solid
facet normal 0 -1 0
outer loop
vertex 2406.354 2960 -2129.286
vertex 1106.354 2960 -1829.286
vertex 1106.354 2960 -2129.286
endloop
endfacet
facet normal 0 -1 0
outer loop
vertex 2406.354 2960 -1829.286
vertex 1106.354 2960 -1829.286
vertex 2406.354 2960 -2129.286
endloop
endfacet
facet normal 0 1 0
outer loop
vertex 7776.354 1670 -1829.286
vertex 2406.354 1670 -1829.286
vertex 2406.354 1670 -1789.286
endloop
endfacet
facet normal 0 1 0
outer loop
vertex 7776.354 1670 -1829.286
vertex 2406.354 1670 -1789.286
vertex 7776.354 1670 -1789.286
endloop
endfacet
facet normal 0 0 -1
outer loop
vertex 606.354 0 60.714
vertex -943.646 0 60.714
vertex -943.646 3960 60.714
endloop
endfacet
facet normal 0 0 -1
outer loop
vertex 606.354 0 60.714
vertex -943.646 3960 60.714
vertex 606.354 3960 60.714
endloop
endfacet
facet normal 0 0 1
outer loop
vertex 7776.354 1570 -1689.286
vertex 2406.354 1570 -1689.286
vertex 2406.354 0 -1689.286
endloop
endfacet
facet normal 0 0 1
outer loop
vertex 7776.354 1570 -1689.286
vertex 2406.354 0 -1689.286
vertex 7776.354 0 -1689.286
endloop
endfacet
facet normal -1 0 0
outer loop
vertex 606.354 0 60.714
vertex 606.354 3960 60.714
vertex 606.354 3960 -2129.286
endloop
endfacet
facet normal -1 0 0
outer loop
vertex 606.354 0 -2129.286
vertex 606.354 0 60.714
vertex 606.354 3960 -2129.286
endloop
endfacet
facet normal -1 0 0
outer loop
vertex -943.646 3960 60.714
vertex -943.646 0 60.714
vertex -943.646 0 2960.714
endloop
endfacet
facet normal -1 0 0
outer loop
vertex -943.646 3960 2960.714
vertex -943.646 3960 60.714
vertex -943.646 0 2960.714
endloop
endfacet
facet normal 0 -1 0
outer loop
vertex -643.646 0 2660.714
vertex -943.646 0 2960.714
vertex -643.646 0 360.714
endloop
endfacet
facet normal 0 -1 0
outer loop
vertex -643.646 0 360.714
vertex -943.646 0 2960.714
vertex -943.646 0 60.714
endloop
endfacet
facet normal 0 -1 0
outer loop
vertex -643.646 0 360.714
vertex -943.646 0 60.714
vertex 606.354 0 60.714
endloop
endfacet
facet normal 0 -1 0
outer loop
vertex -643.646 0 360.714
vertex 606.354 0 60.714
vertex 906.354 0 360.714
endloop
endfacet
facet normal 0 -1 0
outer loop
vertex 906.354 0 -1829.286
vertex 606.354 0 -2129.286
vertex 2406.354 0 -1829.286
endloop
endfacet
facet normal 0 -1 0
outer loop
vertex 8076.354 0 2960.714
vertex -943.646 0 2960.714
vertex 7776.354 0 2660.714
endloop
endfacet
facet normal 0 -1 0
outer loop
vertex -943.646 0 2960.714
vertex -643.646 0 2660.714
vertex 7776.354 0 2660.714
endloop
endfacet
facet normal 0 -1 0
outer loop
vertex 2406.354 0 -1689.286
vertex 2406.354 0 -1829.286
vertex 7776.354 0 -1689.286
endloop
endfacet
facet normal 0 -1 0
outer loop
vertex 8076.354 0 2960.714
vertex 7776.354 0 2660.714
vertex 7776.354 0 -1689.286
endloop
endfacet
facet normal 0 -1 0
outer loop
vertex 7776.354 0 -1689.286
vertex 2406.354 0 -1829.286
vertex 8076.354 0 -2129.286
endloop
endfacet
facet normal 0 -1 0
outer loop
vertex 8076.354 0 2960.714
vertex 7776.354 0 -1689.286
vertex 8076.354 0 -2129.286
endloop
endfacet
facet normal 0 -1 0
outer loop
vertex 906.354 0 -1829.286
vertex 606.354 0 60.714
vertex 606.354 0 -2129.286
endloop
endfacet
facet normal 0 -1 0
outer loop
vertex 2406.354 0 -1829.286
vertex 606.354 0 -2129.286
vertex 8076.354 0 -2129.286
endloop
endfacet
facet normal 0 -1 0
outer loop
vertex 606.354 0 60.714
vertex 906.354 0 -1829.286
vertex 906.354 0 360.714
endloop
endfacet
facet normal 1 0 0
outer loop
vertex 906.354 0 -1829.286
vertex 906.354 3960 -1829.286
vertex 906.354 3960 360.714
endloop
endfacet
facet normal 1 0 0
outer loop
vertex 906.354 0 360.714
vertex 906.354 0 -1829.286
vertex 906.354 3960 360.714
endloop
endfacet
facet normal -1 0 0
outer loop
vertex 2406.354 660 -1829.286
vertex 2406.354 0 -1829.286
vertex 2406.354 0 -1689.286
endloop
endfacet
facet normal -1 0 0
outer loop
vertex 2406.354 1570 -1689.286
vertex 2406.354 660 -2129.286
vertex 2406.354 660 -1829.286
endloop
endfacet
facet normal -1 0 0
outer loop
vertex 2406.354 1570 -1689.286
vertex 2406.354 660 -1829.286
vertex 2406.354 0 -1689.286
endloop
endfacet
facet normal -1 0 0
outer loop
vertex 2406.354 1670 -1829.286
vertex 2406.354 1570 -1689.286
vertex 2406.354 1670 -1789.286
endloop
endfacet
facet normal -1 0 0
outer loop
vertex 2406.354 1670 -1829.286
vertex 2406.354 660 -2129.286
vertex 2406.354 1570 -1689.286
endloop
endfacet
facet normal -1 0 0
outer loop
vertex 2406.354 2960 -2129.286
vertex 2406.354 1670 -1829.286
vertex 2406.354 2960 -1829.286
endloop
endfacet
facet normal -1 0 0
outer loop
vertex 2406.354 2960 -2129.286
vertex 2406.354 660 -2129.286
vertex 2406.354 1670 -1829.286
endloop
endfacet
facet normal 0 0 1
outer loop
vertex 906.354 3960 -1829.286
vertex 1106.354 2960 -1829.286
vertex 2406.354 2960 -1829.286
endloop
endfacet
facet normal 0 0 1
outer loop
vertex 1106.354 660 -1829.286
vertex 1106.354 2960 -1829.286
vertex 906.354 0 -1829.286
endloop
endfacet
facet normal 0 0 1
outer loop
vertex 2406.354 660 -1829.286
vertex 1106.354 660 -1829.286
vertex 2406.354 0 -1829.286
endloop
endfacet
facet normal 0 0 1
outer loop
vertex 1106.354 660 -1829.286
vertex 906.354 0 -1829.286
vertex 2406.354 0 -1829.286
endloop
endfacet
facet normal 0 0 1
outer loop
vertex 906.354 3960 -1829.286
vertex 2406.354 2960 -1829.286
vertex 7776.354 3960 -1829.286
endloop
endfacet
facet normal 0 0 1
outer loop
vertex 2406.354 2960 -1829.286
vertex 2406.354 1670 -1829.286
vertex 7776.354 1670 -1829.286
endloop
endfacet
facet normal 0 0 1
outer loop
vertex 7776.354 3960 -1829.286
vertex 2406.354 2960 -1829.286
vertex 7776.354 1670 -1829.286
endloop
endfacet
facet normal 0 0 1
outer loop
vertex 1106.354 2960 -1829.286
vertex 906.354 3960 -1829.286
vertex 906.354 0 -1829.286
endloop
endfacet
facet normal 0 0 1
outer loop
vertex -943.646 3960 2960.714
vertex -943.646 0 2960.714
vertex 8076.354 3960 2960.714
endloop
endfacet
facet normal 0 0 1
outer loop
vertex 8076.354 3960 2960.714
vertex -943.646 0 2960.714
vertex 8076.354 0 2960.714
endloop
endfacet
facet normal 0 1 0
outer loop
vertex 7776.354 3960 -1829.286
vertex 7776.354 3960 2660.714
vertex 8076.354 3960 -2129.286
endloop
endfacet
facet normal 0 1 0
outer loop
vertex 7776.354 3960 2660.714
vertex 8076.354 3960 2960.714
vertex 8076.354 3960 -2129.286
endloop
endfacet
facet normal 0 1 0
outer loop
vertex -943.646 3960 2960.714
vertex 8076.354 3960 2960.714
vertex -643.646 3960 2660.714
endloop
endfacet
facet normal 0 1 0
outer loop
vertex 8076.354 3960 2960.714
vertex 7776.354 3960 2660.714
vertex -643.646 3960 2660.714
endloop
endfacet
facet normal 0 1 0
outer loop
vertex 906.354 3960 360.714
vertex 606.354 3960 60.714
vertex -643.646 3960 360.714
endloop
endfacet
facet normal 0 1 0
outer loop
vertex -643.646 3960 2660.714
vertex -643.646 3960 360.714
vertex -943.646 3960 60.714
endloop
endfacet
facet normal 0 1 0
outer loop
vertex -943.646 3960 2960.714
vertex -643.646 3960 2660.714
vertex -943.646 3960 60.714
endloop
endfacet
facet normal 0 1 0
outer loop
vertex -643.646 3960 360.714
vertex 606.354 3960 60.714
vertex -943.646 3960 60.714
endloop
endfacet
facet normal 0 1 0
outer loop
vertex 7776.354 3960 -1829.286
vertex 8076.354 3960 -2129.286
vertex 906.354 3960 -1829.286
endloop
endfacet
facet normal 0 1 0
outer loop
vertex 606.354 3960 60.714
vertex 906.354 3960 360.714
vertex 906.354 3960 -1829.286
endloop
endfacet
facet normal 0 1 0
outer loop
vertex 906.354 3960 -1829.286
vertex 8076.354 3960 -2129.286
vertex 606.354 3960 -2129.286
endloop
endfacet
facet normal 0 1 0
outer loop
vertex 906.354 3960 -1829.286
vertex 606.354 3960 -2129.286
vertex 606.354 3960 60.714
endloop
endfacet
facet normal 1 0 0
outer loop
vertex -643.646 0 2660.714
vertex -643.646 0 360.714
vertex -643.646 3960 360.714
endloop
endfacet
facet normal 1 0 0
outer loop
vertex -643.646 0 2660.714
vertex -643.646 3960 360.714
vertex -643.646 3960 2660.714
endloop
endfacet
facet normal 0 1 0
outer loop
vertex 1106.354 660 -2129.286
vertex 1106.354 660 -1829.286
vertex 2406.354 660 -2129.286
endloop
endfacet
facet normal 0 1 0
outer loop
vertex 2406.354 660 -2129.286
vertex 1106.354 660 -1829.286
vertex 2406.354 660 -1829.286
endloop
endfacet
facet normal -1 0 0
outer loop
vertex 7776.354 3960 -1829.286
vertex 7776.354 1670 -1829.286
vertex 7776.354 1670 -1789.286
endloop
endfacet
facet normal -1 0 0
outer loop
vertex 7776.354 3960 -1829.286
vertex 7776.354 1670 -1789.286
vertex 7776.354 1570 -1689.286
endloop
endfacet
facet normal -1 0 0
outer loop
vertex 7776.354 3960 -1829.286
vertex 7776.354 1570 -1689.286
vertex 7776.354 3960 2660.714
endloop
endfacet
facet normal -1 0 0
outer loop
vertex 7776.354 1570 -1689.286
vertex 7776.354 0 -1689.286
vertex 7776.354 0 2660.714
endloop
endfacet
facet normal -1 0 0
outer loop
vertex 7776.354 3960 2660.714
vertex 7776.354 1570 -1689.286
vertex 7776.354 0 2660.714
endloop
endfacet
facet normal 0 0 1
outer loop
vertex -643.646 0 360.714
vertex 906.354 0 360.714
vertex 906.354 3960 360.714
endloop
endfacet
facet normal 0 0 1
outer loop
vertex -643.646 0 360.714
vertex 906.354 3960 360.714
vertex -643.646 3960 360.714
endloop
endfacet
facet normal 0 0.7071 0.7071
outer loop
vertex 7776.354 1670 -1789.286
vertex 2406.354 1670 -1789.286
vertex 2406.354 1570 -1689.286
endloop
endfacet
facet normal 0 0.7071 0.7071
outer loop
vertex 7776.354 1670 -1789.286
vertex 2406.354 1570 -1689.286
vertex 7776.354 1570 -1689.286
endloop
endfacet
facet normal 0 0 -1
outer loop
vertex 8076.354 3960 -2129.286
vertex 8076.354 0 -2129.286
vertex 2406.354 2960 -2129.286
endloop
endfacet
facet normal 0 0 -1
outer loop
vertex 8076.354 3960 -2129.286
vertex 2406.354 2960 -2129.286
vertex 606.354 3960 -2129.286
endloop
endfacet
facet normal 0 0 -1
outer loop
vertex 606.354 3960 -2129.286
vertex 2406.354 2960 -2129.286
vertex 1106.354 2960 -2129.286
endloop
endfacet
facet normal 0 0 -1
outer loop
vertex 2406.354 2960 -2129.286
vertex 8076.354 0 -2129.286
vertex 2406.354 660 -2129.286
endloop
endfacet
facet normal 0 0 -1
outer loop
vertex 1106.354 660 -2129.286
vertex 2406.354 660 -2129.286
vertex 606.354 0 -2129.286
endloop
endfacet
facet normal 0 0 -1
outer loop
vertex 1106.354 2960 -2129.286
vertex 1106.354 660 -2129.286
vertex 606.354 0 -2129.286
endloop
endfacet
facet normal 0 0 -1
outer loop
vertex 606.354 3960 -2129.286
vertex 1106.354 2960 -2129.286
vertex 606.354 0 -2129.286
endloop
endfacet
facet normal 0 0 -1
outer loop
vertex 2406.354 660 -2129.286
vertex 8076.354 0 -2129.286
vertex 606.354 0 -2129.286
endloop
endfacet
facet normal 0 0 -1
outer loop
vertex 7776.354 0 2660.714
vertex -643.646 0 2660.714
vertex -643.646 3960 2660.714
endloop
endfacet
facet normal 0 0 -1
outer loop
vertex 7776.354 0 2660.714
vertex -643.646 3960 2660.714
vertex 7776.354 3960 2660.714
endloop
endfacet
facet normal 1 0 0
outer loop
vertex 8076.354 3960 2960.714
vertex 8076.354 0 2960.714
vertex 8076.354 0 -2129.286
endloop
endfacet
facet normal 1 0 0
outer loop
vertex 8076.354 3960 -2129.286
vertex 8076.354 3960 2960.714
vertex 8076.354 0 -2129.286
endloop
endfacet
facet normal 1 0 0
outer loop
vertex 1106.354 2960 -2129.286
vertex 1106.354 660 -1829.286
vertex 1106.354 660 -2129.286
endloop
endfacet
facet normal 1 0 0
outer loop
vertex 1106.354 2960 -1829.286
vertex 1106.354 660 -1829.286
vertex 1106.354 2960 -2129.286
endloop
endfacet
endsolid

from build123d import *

# Parameters (mm, degrees)
SKETCH_1_W          = 6870
SKETCH_1_H          = 300
EXTRUDE_1_DEPTH     = 3960
SKETCH_3_W          = 1300
SKETCH_3_H          = 2300
CUT_EXTRUDE_1_DEPTH = 300
SKETCH_4_W          = 5370
SKETCH_4_H          = 1670
EXTRUDE_2_DEPTH     = 140
FILLET_START        = -84.347935733
FILLET_1_OUTLINE_W  = 5370
FILLET_1_OUTLINE_H  = 141.421356237
FILLET_1_DEPTH      = 71.347935733


with BuildPart() as part:
    # Эскиз1 → Бобышка-Вытянуть1 (new body)
    with BuildSketch(Plane(origin=(0, 0, 0), x_dir=(1, 0, 0), z_dir=(0, 1, 0))):
        Polygon((8076.35402749, -2660.714005328), (7776.35402749, -2660.714005328), (7776.35402749, 1829.285994672), (7776.35402749, 2129.285994672), (8076.35402749, 2129.285994672), align=None)
        with Locations((4341.35402749, 1979.285994672)):
            Rectangle(SKETCH_1_W, SKETCH_1_H)
        Polygon((-643.64597251, -2960.714005328), (-643.64597251, -2660.714005328), (7776.35402749, -2660.714005328), (8076.35402749, -2660.714005328), (8076.35402749, -2960.714005328), align=None)
        Polygon((-943.64597251, -360.714005328), (-643.64597251, -360.714005328), (-643.64597251, -2660.714005328), (-643.64597251, -2960.714005328), (-943.64597251, -2960.714005328), align=None)
        Polygon((-943.64597251, -60.714005328), (606.35402749, -60.714005328), (606.35402749, 2129.285994672), (906.35402749, 2129.285994672), (906.35402749, 1829.285994672), (906.35402749, -360.714005328), (-643.64597251, -360.714005328), (-943.64597251, -360.714005328), align=None)
    extrude(amount=EXTRUDE_1_DEPTH)

    # Эскиз3 → Вырез-Вытянуть1 (cut)
    with BuildSketch(Plane.XY.offset(-1829.285994672)):
        with Locations((1756.35402749, 1810)):
            Rectangle(SKETCH_3_W, SKETCH_3_H)
    extrude(amount=-CUT_EXTRUDE_1_DEPTH, mode=Mode.SUBTRACT)

    # Эскиз4 → Бобышка-Вытянуть2 (add)
    with BuildSketch(Plane.XY.offset(-1829.285994672)):
        with Locations((5091.35402749, 835)):
            Rectangle(SKETCH_4_W, SKETCH_4_H)
    extrude(amount=EXTRUDE_2_DEPTH)

    # Фаска1: read off the stored shape, not the designer's step
    # Фаска1 outline → Фаска1 (cut)
    with BuildSketch(Plane(origin=(0, 0, 0), x_dir=(1, 0, 0), z_dir=(0, 0.7071067811865476, 0.7071067811865476)).offset(FILLET_START)):
        with Locations((5091.35402749, 2375.373906778)):
            Rectangle(FILLET_1_OUTLINE_W, FILLET_1_OUTLINE_H)
    extrude(amount=FILLET_1_DEPTH, mode=Mode.SUBTRACT)


solid = part.part
